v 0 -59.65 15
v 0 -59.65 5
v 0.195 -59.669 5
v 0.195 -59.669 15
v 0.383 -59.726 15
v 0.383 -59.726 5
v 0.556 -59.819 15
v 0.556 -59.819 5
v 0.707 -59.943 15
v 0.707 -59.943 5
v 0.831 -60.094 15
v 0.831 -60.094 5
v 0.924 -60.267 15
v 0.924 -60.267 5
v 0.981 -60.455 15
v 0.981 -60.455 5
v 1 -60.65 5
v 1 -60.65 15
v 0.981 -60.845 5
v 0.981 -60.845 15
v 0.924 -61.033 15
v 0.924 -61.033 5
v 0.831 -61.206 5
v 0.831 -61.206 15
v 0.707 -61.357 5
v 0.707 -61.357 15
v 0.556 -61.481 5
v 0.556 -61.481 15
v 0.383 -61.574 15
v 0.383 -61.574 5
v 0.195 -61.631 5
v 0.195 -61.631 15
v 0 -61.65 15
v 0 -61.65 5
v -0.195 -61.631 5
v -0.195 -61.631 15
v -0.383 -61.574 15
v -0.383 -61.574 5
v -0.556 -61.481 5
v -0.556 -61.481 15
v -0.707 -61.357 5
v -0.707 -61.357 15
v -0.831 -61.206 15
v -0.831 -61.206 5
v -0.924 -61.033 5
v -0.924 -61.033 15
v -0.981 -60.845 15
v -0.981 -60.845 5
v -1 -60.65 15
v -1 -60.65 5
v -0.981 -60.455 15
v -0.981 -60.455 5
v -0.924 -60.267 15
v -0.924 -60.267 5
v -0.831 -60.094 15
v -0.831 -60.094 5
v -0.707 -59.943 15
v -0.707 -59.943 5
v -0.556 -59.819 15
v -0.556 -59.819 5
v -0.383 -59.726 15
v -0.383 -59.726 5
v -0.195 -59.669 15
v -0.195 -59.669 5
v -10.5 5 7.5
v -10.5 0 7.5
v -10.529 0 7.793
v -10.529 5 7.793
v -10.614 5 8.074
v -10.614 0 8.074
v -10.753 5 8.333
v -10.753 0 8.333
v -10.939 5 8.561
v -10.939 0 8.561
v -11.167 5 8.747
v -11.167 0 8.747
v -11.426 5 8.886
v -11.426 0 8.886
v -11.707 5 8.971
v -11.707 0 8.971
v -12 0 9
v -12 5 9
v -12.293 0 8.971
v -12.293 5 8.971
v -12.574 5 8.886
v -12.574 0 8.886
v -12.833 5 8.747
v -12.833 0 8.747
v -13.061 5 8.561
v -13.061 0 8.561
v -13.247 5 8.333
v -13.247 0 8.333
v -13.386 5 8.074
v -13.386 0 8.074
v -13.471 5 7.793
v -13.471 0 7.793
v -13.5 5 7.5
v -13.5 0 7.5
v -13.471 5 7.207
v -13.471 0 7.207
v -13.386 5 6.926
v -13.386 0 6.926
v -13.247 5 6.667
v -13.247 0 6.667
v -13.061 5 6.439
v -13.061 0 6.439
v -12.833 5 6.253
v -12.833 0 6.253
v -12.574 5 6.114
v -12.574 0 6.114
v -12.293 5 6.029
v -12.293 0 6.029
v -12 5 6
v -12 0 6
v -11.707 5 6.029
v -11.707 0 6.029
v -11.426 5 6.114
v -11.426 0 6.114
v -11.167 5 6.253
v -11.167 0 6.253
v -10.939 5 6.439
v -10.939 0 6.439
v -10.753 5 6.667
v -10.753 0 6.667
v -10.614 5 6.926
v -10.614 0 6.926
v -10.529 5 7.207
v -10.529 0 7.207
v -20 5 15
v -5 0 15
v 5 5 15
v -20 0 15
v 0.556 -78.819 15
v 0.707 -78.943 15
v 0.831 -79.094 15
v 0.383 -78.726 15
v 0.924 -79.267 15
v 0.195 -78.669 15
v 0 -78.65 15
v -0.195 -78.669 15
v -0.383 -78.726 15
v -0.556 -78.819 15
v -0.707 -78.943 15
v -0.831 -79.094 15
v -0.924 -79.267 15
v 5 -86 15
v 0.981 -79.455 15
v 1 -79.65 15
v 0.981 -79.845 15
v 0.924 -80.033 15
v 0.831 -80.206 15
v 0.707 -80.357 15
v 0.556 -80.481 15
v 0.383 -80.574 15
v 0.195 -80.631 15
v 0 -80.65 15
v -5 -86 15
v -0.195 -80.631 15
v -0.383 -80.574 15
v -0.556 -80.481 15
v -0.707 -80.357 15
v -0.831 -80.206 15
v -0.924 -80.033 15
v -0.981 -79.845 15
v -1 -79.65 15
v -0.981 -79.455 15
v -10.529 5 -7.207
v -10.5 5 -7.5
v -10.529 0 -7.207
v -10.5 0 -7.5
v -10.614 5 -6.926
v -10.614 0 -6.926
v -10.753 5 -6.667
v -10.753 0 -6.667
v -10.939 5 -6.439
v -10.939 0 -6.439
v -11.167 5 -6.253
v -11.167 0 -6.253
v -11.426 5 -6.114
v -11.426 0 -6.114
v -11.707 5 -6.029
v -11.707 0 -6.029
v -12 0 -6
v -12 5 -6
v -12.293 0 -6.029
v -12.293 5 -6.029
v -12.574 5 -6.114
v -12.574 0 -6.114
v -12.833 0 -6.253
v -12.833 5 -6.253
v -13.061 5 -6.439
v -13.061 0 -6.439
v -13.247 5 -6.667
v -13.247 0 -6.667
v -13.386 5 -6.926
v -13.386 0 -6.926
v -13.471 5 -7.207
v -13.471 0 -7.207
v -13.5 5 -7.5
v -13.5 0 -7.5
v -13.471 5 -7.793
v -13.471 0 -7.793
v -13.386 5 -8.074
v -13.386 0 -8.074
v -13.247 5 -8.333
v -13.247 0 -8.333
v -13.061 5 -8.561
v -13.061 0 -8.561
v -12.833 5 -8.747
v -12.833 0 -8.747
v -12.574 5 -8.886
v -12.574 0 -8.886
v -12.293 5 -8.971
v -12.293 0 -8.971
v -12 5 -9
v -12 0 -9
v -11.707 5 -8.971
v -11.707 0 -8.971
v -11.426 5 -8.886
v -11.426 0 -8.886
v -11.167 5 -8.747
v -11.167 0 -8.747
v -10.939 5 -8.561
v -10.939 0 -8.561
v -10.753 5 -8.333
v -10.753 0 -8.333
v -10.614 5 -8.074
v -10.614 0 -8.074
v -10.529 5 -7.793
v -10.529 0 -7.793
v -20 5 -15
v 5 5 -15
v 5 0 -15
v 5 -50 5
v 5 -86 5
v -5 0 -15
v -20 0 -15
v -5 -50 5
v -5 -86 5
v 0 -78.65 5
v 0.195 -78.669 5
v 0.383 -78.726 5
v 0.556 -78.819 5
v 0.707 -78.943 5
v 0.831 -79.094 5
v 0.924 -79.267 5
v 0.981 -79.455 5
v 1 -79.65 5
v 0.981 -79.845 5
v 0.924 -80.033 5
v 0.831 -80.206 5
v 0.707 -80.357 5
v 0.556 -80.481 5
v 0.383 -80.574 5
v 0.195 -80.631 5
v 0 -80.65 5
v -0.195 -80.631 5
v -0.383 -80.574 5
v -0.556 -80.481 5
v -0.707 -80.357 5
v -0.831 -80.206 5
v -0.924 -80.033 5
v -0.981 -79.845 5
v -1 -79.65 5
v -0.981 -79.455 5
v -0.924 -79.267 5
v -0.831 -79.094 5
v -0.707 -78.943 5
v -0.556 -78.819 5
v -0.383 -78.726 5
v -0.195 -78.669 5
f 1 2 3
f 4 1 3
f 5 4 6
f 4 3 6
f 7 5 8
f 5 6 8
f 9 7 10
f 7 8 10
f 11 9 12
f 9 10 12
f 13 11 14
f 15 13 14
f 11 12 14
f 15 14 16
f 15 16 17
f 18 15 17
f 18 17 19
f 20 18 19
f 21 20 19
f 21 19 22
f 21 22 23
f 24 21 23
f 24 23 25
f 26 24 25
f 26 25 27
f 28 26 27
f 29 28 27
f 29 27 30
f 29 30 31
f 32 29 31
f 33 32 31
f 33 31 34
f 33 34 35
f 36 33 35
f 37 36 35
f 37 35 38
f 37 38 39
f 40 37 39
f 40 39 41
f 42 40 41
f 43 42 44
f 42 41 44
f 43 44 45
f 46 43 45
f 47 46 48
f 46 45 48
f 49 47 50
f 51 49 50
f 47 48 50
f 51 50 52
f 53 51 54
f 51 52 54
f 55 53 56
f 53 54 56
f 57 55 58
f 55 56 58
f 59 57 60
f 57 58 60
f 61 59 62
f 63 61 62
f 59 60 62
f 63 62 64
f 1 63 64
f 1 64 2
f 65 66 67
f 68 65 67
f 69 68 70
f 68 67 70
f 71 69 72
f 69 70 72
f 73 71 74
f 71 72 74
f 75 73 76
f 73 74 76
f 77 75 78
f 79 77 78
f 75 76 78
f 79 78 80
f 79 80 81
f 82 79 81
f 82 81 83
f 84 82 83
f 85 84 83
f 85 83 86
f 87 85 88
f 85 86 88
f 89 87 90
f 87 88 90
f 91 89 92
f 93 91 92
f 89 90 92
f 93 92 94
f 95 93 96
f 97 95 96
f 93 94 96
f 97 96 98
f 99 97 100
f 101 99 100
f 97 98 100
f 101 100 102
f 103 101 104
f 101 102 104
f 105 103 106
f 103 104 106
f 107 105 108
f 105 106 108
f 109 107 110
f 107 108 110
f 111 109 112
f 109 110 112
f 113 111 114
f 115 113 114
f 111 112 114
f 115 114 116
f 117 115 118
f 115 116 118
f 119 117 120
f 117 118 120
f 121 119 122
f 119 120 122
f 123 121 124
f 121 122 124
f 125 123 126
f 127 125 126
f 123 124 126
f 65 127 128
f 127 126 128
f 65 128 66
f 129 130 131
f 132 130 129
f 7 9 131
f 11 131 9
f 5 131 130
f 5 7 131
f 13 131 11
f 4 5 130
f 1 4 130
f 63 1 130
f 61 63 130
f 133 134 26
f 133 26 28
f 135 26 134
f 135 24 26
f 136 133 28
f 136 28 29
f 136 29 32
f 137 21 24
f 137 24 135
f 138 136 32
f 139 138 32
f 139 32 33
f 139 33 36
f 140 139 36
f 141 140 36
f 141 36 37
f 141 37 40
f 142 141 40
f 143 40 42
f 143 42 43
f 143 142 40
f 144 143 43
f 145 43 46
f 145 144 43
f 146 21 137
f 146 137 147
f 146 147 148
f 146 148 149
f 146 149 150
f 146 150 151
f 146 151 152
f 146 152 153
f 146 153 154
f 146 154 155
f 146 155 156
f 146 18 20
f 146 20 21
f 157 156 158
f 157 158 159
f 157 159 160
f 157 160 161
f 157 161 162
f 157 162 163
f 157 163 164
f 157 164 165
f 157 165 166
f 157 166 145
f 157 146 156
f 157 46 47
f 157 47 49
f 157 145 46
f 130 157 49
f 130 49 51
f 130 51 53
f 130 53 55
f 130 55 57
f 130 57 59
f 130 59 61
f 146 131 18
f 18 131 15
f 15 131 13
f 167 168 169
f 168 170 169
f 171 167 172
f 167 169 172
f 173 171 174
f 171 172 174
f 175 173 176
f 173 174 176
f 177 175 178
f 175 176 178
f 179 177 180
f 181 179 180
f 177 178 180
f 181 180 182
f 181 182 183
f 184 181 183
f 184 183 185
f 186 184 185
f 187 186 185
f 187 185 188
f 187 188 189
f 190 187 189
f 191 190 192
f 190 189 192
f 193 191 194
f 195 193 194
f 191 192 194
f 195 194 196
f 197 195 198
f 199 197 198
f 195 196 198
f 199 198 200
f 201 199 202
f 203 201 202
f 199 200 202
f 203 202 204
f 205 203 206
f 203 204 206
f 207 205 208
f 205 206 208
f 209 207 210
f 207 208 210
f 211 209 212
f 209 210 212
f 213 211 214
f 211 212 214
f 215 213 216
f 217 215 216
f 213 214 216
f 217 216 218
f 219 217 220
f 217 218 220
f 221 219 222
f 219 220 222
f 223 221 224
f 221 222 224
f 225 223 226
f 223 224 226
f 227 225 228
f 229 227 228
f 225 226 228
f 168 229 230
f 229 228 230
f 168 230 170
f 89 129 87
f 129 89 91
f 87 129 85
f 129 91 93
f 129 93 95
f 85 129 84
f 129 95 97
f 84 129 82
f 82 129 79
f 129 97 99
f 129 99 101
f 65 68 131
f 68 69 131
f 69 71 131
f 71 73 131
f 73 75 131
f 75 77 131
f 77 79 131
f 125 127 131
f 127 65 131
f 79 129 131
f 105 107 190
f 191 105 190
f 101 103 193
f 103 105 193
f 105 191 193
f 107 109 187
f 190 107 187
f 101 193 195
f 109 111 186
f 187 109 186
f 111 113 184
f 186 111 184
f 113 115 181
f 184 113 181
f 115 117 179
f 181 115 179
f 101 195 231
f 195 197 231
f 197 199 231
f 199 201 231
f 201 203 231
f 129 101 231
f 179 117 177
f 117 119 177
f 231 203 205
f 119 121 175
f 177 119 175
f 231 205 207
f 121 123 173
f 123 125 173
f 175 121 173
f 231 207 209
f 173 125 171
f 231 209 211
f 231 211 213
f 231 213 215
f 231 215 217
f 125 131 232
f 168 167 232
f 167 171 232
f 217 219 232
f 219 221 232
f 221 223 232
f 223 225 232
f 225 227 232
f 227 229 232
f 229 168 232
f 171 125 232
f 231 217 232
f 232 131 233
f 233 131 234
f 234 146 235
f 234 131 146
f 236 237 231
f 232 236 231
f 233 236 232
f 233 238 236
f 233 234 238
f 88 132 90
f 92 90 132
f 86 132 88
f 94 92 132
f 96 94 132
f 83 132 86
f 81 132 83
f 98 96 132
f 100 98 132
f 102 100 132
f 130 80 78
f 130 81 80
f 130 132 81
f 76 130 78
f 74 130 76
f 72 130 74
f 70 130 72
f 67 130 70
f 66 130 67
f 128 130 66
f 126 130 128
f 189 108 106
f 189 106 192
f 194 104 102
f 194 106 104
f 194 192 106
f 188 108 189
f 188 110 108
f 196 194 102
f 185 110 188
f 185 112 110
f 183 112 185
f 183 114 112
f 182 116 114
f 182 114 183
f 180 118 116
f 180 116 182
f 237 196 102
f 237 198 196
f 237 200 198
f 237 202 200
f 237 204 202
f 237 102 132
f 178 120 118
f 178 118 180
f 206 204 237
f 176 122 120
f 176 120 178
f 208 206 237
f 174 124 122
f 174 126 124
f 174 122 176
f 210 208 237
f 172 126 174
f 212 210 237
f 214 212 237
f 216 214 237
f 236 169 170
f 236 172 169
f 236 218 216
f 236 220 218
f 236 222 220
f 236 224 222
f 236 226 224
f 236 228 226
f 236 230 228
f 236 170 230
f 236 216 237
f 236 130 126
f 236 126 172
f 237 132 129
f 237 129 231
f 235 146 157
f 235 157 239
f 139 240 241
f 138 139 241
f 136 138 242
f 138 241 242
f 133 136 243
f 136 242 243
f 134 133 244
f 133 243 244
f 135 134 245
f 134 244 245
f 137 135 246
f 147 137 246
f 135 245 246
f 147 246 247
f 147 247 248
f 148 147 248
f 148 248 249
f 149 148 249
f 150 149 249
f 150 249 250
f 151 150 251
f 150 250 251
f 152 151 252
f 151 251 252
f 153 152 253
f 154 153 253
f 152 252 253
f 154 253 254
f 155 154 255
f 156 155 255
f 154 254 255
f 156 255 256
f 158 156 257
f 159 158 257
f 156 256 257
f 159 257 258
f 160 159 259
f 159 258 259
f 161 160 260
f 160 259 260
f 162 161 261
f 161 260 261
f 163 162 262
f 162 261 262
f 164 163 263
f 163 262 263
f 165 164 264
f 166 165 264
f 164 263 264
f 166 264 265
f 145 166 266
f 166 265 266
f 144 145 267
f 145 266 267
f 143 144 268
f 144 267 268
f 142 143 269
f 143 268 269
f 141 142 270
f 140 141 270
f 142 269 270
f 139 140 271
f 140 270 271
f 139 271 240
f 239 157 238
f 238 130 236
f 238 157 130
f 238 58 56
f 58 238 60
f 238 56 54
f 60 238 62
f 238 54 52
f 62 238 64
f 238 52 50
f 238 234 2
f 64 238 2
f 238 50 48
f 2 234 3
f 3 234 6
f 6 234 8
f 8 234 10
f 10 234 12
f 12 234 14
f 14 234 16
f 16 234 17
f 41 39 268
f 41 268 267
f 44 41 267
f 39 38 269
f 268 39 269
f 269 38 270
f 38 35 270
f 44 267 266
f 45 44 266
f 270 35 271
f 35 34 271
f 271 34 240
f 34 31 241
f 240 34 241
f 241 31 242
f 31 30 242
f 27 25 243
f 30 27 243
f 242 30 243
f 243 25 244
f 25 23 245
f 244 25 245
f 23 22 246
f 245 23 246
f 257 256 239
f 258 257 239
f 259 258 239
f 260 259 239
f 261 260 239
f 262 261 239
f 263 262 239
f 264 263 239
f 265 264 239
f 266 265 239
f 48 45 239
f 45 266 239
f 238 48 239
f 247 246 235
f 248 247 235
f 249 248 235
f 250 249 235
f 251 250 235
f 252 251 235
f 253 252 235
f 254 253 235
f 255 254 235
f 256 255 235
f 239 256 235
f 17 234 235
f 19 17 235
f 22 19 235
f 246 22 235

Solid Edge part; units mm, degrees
sketch "Sketch1" plane through (0, 0, 0) normal (0, -1, 0) x (1, 0, 0)
  line L0 (-20, -15) -> (20, -15)
  line L1 (20, -15) -> (20, 15)
  line L2 (20, 15) -> (-20, 15)
  line L3 (-20, 15) -> (-20, -15)
  dimension "D1" = 40
  dimension "D2" = 30
extrude "Protrusion1" add sketch "Sketch1" against normal blind 5
sketch "Sketch2" plane through (0, 0, 0) normal (0, -1, 0) x (1, 0, 0)
  line L0 (-5, -15) -> (5, -15)
  line L1 (5, -15) -> (5, 15)
  line L2 (5, 15) -> (-5, 15)
  line L3 (-5, 15) -> (-5, -15)
extrude "Extrusionsausprägung_2" add sketch "Sketch2" along normal blind 86
sketch "Sketch3" plane through (5, -37.5, 0) normal (1, 0, 0) x (0, 1, 0)
  line L0 (-52.5, 5) -> (-52.5, -15)
  line L1 (-12.5, 5) -> (-52.5, 5)
  line L2 (-12.5, 5) -> (37.5, -15)
  line L3 (37.5, -15) -> (-48.5, -15)
  dimension "D1" = 20
  dimension "D2" = 40
extrude "Cutout1" cut sketch "Sketch3" against normal through all material side at (5, -89.95, -5)
sketch "Sketch4" plane through (0, -55, 5) normal (0, 0, -1) x (0, 1, 0)
  circle A0 centre (-5.65, 0) radius 1
  circle A1 centre (-24.65, 0) radius 1
  dimension "D1" = 19
  dimension "D2" = 2
  dimension "D3" = 5
  dimension "D4" = 60.65
extrude "Cutout2" cut sketch "Sketch4" against normal through all
sketch "Sketch5" plane through (-12.5, 0, 0) normal (0, -1, 0) x (1, 0, 0)
  circle A0 centre (0.5, 7.5) radius 1.5
  circle A1 centre (0.5, -7.5) radius 1.5
  dimension "D1" = 3
  dimension "D2" = 15
  dimension "D3" = 7.5
  dimension "D4" = 12
extrude "Cutout3" cut sketch "Sketch5" against normal through all
sketch "Sketch6" plane through (12.5, 0, 0) normal (0, -1, 0) x (1, 0, 0)
  line L0 (7.5, 15) -> (-7.5, 15)
  line L1 (-7.5, 15) -> (-7.5, -15)
  line L2 (-7.5, -15) -> (7.5, -15)
  line L3 (7.5, -15) -> (7.5, 15)
extrude "Cutout4" cut sketch "Sketch6" against normal through all
properties material "Nylon, allgemein"
